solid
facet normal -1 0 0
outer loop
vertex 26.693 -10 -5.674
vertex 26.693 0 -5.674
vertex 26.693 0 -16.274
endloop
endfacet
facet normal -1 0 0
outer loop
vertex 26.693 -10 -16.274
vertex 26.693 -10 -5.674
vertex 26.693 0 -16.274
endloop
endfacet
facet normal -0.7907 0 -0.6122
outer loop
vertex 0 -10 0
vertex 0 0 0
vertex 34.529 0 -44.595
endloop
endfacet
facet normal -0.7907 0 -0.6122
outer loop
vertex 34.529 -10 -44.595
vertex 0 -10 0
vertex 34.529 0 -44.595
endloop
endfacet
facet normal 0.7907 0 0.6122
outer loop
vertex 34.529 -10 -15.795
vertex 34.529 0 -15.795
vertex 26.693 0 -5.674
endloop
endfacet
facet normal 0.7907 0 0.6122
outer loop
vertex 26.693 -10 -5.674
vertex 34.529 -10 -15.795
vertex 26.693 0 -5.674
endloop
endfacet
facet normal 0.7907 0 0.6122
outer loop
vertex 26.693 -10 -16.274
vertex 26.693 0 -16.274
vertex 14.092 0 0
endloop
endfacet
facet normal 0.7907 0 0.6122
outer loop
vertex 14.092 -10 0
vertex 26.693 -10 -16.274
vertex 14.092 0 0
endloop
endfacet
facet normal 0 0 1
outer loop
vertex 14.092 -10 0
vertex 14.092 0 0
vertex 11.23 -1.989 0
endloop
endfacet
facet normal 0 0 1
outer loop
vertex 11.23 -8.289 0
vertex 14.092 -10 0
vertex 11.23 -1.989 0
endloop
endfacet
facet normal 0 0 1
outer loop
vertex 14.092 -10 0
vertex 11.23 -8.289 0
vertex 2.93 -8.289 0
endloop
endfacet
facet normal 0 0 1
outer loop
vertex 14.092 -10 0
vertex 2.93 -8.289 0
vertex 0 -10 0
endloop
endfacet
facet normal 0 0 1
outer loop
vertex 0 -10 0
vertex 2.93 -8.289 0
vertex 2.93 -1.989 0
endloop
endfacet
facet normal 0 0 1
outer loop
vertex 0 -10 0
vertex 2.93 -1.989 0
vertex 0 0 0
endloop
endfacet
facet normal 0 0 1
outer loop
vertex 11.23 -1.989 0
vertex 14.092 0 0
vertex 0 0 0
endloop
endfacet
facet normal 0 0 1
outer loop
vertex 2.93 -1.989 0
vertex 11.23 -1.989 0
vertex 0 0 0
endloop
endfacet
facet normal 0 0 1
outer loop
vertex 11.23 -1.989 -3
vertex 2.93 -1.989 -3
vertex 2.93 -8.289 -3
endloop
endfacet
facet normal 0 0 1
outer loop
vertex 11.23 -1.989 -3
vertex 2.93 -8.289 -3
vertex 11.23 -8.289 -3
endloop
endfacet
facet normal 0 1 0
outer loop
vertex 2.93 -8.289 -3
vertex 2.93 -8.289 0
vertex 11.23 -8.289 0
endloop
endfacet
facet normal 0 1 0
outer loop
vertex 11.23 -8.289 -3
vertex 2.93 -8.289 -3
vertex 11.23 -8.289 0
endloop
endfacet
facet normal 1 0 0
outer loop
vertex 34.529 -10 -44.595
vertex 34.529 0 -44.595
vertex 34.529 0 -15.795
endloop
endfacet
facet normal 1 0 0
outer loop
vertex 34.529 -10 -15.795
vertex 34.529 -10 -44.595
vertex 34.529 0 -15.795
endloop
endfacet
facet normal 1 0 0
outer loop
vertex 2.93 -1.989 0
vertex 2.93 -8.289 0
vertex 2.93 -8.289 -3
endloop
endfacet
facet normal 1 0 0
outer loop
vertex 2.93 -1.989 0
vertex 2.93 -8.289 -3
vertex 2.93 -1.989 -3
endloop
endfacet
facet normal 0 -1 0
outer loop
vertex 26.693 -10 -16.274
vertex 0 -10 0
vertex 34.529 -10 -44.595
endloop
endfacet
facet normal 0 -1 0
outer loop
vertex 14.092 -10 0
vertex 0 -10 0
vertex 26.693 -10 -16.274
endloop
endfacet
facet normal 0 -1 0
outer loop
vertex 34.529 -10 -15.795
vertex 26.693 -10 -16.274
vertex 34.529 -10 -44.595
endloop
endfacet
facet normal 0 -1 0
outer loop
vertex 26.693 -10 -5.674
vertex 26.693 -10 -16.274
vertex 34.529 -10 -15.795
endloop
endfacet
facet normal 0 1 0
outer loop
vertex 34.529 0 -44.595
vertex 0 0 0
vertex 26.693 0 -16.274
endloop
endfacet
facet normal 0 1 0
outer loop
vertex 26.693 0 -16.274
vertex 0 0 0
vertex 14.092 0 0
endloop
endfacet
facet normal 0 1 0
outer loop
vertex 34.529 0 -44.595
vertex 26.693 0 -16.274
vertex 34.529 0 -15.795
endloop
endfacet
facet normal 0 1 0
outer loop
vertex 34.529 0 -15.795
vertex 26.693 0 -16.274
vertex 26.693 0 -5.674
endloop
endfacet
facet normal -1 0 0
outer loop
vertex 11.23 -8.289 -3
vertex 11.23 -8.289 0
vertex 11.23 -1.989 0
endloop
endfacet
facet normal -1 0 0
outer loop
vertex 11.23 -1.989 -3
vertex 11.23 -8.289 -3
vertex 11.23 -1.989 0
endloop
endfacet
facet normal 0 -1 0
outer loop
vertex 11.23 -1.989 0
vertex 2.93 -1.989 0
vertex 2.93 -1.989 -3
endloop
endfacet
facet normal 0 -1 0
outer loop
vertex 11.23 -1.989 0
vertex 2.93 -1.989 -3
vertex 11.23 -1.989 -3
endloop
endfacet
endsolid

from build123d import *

# Parameters (mm, degrees)
F1_DEPTH = 10
F2_W     = 8.3
F2_H     = 6.3
F3_DEPTH = 3


with BuildPart() as f1:
    # F0 (on Front) → F1 (new body)
    with BuildSketch(Plane.XZ):
        Polygon((14.091946, 0), (0, 0), (34.529055, -44.594892), (34.529055, -15.794892), (26.692673, -5.674065), (26.692673, -16.274065), align=None)
    extrude(amount=F1_DEPTH)

    # F2 (on Top) → F3 (cut)
    with BuildSketch(Plane.XY):
        with Locations((7.079836, -5.139073)):
            Rectangle(F2_W, F2_H)
    extrude(amount=-F3_DEPTH, mode=Mode.SUBTRACT)


solid = f1.part
